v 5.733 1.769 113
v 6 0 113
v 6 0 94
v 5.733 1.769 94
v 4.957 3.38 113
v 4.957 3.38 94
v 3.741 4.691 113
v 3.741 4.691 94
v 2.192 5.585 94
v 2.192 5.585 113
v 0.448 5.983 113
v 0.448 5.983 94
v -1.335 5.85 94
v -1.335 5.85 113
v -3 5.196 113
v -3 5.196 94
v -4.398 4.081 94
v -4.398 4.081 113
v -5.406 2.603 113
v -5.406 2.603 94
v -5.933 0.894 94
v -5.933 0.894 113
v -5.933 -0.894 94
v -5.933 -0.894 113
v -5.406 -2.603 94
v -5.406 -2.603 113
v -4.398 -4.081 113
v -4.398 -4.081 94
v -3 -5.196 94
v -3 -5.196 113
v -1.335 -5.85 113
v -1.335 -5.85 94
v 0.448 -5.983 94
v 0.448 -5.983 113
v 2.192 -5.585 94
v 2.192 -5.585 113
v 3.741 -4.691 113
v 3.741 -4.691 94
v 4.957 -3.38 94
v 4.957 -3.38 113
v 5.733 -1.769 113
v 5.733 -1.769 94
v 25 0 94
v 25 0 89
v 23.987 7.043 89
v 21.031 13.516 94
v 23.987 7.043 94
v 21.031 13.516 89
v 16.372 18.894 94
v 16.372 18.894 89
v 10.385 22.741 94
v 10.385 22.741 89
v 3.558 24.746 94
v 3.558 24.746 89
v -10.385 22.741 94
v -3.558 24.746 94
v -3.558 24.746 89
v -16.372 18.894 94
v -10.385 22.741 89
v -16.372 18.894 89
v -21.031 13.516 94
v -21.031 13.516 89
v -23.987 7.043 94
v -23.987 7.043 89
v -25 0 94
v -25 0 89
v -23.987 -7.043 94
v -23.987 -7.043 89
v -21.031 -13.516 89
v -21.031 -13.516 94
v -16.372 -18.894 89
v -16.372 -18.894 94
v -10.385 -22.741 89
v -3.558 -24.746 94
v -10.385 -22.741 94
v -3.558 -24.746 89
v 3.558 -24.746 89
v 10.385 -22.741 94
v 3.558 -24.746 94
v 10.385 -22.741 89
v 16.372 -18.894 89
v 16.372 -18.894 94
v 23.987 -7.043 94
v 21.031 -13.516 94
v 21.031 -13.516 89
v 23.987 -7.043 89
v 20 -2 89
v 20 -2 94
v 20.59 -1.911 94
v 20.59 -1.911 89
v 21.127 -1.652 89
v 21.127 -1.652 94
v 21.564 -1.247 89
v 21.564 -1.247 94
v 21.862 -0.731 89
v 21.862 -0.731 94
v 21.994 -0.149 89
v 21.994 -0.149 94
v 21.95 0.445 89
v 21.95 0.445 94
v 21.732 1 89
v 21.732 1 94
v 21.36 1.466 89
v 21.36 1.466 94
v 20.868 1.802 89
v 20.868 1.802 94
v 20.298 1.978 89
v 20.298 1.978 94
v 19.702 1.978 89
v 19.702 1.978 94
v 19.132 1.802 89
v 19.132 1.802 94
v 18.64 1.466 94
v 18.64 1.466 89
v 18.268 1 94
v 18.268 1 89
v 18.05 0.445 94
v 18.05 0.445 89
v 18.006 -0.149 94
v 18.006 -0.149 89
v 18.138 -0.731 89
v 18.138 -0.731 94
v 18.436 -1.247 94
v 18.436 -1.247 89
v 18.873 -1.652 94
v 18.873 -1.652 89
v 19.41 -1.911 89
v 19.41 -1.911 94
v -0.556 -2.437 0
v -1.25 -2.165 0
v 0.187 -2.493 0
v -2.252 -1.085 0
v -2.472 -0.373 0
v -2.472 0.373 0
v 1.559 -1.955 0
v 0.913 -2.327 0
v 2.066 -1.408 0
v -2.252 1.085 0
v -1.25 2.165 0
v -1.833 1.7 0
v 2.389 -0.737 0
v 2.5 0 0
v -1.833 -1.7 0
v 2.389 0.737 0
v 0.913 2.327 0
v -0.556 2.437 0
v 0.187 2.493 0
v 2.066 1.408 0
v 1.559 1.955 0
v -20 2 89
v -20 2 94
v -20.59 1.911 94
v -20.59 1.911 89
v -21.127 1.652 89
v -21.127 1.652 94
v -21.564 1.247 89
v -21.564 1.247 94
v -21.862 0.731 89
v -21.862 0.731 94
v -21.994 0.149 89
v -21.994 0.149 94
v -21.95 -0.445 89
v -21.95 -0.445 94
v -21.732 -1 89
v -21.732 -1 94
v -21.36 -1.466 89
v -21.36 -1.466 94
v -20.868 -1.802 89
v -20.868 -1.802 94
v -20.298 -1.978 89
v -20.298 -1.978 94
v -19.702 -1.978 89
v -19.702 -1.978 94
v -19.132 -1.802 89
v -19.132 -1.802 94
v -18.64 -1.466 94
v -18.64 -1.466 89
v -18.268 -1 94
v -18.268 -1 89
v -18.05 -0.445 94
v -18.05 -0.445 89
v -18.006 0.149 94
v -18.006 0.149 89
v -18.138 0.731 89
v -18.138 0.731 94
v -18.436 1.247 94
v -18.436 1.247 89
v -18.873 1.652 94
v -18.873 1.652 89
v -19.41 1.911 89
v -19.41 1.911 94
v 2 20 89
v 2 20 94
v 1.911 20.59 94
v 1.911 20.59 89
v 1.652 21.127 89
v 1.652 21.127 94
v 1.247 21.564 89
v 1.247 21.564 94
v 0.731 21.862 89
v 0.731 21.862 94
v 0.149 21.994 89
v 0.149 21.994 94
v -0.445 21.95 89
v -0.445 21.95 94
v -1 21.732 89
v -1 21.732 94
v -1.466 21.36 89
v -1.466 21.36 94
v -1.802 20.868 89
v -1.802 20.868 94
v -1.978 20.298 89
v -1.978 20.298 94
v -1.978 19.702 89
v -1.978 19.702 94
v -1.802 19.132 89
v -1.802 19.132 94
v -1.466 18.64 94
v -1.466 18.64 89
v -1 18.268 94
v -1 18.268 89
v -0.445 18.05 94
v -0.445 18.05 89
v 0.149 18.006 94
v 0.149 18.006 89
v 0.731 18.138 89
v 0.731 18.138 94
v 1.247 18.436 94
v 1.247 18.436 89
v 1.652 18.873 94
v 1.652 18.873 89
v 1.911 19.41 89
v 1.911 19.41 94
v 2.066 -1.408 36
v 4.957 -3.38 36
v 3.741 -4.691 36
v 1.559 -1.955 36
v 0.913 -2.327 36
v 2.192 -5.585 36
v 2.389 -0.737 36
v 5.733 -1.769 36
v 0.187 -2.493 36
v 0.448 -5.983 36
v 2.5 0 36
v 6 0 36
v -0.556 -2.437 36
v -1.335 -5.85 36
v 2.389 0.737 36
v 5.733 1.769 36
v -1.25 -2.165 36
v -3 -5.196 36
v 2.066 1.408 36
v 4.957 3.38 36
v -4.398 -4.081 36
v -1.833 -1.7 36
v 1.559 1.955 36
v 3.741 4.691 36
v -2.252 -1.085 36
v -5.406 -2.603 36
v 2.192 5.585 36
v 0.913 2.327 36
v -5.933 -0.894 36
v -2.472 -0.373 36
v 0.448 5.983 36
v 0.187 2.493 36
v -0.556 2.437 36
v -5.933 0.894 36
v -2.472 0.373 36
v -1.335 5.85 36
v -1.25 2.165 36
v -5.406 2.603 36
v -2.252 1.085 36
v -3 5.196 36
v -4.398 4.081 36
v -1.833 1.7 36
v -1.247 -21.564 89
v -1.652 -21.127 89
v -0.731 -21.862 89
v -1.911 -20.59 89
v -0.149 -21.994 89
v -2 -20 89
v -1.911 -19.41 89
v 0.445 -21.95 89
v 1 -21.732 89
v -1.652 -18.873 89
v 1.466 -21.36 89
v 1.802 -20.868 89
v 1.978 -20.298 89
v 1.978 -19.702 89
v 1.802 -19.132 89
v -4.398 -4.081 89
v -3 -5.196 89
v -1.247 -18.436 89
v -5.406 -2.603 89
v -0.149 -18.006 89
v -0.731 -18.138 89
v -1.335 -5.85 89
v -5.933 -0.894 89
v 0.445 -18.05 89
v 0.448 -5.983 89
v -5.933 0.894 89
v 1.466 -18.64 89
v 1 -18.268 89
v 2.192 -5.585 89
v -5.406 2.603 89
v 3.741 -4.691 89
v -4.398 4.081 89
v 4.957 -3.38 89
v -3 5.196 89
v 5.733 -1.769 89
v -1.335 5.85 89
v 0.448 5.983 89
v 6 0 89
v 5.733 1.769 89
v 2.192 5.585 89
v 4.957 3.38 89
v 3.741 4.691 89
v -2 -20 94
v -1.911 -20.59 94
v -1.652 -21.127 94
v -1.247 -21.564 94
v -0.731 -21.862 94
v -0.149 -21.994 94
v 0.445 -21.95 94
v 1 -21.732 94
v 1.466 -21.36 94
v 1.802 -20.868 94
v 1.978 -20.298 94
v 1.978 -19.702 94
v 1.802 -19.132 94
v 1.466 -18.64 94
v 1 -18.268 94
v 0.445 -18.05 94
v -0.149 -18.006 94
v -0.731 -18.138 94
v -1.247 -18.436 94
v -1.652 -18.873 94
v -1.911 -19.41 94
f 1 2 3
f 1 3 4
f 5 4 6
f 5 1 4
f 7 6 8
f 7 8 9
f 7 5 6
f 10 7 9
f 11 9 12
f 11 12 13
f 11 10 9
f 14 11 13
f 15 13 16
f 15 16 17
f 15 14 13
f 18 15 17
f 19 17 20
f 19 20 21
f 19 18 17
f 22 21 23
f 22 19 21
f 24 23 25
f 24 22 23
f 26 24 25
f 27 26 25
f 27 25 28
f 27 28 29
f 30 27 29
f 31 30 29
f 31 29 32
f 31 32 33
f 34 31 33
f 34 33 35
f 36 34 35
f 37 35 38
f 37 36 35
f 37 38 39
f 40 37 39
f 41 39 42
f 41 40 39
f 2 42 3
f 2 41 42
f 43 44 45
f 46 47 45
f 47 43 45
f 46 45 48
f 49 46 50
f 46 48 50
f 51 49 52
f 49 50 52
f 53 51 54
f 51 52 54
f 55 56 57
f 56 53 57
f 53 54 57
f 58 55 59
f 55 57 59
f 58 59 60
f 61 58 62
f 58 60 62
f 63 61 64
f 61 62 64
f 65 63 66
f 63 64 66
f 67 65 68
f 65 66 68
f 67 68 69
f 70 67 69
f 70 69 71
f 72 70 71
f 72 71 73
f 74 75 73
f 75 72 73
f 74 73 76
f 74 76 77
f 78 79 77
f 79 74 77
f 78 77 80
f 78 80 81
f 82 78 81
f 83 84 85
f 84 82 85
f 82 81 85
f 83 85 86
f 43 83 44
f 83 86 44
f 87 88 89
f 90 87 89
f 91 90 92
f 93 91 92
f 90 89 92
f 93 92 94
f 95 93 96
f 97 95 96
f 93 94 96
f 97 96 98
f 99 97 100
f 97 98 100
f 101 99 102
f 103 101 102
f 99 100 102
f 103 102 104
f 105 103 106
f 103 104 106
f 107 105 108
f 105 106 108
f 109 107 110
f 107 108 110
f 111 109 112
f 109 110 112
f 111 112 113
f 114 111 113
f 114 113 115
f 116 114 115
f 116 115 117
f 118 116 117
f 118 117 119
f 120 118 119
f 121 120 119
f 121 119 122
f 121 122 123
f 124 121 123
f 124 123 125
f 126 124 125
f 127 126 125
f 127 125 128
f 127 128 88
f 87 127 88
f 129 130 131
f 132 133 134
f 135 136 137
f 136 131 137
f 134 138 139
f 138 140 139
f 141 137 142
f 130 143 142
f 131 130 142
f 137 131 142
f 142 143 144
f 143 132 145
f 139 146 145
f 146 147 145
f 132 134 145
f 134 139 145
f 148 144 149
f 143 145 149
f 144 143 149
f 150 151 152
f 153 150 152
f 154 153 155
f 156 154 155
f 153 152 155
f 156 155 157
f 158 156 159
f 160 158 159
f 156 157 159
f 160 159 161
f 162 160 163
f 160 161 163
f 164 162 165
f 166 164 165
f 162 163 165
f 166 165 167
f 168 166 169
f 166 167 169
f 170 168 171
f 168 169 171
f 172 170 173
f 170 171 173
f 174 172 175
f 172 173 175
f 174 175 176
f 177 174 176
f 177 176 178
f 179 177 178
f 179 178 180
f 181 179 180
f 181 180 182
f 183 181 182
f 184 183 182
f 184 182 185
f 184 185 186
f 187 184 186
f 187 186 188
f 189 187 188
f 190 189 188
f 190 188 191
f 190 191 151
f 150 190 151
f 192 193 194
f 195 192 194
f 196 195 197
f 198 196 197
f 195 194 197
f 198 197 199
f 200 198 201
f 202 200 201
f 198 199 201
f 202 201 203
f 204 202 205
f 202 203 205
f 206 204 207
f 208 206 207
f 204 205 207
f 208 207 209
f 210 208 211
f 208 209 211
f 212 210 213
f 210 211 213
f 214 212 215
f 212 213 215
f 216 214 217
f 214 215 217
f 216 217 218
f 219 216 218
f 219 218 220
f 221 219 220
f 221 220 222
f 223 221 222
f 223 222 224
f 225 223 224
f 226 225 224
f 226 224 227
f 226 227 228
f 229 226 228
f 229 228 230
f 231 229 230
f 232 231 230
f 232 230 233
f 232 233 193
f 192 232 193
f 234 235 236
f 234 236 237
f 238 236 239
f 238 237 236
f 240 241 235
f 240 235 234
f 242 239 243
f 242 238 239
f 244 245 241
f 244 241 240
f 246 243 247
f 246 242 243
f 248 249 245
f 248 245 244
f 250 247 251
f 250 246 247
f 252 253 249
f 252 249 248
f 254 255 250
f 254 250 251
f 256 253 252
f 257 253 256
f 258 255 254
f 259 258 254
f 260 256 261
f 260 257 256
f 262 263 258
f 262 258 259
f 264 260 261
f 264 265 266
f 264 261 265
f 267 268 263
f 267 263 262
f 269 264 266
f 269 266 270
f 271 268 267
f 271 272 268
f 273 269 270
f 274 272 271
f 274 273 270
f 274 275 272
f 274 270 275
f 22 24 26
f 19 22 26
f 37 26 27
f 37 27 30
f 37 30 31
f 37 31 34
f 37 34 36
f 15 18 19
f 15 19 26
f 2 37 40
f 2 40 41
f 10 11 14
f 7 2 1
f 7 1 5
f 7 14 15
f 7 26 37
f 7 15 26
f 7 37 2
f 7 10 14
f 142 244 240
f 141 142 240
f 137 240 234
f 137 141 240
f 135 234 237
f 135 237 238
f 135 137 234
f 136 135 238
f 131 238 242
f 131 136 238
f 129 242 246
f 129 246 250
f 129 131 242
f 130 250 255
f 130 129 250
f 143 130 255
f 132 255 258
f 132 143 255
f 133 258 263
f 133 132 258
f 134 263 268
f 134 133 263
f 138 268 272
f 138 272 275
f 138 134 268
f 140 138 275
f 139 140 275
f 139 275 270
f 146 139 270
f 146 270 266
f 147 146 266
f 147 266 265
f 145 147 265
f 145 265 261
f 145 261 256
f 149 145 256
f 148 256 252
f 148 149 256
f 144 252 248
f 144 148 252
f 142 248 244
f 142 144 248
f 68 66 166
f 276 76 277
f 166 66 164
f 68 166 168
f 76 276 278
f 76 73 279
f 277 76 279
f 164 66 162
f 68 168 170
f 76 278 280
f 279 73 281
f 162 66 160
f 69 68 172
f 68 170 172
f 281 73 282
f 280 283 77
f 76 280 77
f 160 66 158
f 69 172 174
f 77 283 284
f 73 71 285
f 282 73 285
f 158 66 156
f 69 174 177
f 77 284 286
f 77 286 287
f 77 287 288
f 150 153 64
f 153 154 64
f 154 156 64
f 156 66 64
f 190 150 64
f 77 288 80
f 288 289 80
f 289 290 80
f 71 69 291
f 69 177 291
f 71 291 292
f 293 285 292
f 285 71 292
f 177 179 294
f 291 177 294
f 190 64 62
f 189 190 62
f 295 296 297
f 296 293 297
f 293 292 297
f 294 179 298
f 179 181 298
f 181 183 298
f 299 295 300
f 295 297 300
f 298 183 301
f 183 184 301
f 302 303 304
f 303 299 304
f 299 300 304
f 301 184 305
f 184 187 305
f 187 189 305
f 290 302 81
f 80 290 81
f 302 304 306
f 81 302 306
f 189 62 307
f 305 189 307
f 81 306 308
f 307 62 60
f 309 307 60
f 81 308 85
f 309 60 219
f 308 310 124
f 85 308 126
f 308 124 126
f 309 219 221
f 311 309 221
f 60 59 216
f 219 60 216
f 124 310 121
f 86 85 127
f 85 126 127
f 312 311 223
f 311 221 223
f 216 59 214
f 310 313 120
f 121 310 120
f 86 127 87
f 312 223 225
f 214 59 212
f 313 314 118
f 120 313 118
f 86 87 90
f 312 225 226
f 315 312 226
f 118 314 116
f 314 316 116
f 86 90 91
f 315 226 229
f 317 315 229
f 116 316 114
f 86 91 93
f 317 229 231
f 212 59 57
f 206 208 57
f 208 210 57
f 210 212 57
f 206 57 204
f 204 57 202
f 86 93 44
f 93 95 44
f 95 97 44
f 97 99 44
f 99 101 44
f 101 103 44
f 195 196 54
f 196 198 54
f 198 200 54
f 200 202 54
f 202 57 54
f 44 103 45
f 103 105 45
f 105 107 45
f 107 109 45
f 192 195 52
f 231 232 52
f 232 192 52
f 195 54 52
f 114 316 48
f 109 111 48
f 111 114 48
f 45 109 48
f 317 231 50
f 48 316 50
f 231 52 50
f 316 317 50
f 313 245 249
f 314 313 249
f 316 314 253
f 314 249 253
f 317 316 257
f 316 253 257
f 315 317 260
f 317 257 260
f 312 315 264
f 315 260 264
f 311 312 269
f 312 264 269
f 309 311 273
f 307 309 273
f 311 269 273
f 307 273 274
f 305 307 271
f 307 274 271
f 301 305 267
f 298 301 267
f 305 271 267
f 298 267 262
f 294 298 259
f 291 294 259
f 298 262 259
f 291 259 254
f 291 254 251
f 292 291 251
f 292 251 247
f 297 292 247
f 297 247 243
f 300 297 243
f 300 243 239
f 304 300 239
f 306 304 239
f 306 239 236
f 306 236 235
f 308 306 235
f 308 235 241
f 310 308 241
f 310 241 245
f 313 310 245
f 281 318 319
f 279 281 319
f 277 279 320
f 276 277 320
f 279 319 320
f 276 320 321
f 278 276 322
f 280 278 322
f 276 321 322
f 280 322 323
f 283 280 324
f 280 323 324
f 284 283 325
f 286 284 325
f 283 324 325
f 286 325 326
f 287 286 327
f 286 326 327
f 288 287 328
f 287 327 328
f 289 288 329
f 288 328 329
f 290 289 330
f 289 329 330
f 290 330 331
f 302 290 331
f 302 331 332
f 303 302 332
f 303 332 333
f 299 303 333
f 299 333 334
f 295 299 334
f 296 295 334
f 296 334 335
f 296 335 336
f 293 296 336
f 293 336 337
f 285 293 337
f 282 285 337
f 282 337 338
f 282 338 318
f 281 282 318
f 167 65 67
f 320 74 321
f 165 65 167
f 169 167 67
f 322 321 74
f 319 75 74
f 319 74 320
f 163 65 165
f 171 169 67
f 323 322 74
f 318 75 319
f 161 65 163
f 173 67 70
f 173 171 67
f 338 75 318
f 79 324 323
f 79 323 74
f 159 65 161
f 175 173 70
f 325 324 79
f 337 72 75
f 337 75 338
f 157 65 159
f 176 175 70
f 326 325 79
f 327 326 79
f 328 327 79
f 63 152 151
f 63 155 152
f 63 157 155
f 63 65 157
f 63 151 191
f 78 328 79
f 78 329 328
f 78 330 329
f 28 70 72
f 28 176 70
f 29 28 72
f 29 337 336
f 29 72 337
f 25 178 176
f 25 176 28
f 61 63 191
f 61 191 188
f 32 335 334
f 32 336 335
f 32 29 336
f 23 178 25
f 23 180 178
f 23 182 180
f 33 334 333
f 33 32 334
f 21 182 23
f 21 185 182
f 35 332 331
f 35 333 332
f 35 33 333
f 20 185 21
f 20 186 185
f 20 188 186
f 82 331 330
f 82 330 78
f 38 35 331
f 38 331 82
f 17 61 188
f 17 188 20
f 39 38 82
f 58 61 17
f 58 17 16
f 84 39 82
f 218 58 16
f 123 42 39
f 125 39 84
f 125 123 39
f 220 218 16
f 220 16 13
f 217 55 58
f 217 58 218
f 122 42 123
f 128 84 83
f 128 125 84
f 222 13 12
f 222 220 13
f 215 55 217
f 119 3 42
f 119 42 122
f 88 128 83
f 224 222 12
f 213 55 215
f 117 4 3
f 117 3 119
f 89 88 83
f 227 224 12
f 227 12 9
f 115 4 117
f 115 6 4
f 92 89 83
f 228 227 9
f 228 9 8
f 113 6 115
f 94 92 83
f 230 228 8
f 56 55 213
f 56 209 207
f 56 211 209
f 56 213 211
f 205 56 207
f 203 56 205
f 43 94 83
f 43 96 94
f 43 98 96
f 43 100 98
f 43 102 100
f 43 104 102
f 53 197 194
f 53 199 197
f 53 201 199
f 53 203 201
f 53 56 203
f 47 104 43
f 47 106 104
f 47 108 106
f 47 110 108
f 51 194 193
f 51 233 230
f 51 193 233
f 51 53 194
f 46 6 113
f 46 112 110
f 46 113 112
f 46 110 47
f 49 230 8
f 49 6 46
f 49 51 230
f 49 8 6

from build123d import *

# Parameters (mm, degrees)
ESQUISSE1_R                  = 25
BOSS_EXTRU_1_DEPTH           = 113
ESQUISSE2_OUTSIDE_W          = 78.66
ESQUISSE2_OUTSIDE_H          = 78.66
ESQUISSE2_OUTSIDE_R          = 6
ENL_V_MAT_EXTRU_1_DEPTH      = 19
ESQUISSE3_OUTSIDE_W          = 78.66
ESQUISSE3_OUTSIDE_H          = 78.66
ESQUISSE3_OUTSIDE_R          = 6
ENL_V_MAT_EXTRU_3_DEPTH      = 89
ENL_V_MAT_EXTRU_3_DEPTH_BACK = 89
ESQUISSE4_OUTSIDE_W          = 78.66
ESQUISSE4_OUTSIDE_H          = 78.66
ESQUISSE4_OUTSIDE_R          = 2.5
ENL_V_MAT_EXTRU_4_DEPTH      = 36
ENL_V_MAT_EXTRU_4_DEPTH_BACK = 36
ESQUISSE8_R                  = 2
ENL_V_MAT_EXTRU_5_DEPTH      = 95
R_P_TITION_CIRCULAIRE2_COUNT = 4


with BuildPart() as part:
    # Esquisse1 → Boss.-Extru.1 (new body)
    with BuildSketch(Plane.XY):
        Circle(ESQUISSE1_R)
    extrude(amount=BOSS_EXTRU_1_DEPTH)

    # Esquisse2 outside → Enl_v. mat.-Extru.1 (cut)
    with BuildSketch(Plane.XY.offset(113)):
        Rectangle(ESQUISSE2_OUTSIDE_W, ESQUISSE2_OUTSIDE_H)
        Circle(ESQUISSE2_OUTSIDE_R, mode=Mode.SUBTRACT)
    extrude(amount=-ENL_V_MAT_EXTRU_1_DEPTH, mode=Mode.SUBTRACT)

    # Esquisse3 outside → Enl_v. mat.-Extru.3 (cut, two sides)
    with BuildSketch(Plane.XY) as enl_v_mat_extru_3_sk:
        Rectangle(ESQUISSE3_OUTSIDE_W, ESQUISSE3_OUTSIDE_H)
        Circle(ESQUISSE3_OUTSIDE_R, mode=Mode.SUBTRACT)
    extrude(amount=ENL_V_MAT_EXTRU_3_DEPTH, mode=Mode.SUBTRACT)
    extrude(enl_v_mat_extru_3_sk.sketch, amount=-ENL_V_MAT_EXTRU_3_DEPTH_BACK, mode=Mode.SUBTRACT)

    # Esquisse4 outside → Enl_v. mat.-Extru.4 (cut, two sides)
    with BuildSketch(Plane(origin=(0, 0, 0), x_dir=(-1, 0, 0), z_dir=(0, 0, -1))) as enl_v_mat_extru_4_sk:
        Rectangle(ESQUISSE4_OUTSIDE_W, ESQUISSE4_OUTSIDE_H)
        with Locations(Location((0, 0, 0), (0, 0, 180))):  # turned: the seam where the file's is
            Circle(ESQUISSE4_OUTSIDE_R, mode=Mode.SUBTRACT)
    extrude(amount=ENL_V_MAT_EXTRU_4_DEPTH, mode=Mode.SUBTRACT)
    extrude(enl_v_mat_extru_4_sk.sketch, amount=-ENL_V_MAT_EXTRU_4_DEPTH_BACK, mode=Mode.SUBTRACT)

    # Esquisse8 → Enl_v. mat.-Extru.5 (cut, through all)
    with BuildSketch(Plane.XY.offset(94)):
        with Locations((0, 20)):
            Circle(ESQUISSE8_R)
    enl_v_mat_extru_5 = extrude(amount=-ENL_V_MAT_EXTRU_5_DEPTH, mode=Mode.SUBTRACT)

    # R_p_tition circulaire2: Enl_v. mat.-Extru.5 ×4 about axis
    r_p_tition_circulaire2_axis = Axis((0, 0, 0), (0, 0, 1))
    for i in range(1, R_P_TITION_CIRCULAIRE2_COUNT):
        add(enl_v_mat_extru_5.rotate(r_p_tition_circulaire2_axis, i * 360 / R_P_TITION_CIRCULAIRE2_COUNT), mode=Mode.SUBTRACT)


solid = part.part
